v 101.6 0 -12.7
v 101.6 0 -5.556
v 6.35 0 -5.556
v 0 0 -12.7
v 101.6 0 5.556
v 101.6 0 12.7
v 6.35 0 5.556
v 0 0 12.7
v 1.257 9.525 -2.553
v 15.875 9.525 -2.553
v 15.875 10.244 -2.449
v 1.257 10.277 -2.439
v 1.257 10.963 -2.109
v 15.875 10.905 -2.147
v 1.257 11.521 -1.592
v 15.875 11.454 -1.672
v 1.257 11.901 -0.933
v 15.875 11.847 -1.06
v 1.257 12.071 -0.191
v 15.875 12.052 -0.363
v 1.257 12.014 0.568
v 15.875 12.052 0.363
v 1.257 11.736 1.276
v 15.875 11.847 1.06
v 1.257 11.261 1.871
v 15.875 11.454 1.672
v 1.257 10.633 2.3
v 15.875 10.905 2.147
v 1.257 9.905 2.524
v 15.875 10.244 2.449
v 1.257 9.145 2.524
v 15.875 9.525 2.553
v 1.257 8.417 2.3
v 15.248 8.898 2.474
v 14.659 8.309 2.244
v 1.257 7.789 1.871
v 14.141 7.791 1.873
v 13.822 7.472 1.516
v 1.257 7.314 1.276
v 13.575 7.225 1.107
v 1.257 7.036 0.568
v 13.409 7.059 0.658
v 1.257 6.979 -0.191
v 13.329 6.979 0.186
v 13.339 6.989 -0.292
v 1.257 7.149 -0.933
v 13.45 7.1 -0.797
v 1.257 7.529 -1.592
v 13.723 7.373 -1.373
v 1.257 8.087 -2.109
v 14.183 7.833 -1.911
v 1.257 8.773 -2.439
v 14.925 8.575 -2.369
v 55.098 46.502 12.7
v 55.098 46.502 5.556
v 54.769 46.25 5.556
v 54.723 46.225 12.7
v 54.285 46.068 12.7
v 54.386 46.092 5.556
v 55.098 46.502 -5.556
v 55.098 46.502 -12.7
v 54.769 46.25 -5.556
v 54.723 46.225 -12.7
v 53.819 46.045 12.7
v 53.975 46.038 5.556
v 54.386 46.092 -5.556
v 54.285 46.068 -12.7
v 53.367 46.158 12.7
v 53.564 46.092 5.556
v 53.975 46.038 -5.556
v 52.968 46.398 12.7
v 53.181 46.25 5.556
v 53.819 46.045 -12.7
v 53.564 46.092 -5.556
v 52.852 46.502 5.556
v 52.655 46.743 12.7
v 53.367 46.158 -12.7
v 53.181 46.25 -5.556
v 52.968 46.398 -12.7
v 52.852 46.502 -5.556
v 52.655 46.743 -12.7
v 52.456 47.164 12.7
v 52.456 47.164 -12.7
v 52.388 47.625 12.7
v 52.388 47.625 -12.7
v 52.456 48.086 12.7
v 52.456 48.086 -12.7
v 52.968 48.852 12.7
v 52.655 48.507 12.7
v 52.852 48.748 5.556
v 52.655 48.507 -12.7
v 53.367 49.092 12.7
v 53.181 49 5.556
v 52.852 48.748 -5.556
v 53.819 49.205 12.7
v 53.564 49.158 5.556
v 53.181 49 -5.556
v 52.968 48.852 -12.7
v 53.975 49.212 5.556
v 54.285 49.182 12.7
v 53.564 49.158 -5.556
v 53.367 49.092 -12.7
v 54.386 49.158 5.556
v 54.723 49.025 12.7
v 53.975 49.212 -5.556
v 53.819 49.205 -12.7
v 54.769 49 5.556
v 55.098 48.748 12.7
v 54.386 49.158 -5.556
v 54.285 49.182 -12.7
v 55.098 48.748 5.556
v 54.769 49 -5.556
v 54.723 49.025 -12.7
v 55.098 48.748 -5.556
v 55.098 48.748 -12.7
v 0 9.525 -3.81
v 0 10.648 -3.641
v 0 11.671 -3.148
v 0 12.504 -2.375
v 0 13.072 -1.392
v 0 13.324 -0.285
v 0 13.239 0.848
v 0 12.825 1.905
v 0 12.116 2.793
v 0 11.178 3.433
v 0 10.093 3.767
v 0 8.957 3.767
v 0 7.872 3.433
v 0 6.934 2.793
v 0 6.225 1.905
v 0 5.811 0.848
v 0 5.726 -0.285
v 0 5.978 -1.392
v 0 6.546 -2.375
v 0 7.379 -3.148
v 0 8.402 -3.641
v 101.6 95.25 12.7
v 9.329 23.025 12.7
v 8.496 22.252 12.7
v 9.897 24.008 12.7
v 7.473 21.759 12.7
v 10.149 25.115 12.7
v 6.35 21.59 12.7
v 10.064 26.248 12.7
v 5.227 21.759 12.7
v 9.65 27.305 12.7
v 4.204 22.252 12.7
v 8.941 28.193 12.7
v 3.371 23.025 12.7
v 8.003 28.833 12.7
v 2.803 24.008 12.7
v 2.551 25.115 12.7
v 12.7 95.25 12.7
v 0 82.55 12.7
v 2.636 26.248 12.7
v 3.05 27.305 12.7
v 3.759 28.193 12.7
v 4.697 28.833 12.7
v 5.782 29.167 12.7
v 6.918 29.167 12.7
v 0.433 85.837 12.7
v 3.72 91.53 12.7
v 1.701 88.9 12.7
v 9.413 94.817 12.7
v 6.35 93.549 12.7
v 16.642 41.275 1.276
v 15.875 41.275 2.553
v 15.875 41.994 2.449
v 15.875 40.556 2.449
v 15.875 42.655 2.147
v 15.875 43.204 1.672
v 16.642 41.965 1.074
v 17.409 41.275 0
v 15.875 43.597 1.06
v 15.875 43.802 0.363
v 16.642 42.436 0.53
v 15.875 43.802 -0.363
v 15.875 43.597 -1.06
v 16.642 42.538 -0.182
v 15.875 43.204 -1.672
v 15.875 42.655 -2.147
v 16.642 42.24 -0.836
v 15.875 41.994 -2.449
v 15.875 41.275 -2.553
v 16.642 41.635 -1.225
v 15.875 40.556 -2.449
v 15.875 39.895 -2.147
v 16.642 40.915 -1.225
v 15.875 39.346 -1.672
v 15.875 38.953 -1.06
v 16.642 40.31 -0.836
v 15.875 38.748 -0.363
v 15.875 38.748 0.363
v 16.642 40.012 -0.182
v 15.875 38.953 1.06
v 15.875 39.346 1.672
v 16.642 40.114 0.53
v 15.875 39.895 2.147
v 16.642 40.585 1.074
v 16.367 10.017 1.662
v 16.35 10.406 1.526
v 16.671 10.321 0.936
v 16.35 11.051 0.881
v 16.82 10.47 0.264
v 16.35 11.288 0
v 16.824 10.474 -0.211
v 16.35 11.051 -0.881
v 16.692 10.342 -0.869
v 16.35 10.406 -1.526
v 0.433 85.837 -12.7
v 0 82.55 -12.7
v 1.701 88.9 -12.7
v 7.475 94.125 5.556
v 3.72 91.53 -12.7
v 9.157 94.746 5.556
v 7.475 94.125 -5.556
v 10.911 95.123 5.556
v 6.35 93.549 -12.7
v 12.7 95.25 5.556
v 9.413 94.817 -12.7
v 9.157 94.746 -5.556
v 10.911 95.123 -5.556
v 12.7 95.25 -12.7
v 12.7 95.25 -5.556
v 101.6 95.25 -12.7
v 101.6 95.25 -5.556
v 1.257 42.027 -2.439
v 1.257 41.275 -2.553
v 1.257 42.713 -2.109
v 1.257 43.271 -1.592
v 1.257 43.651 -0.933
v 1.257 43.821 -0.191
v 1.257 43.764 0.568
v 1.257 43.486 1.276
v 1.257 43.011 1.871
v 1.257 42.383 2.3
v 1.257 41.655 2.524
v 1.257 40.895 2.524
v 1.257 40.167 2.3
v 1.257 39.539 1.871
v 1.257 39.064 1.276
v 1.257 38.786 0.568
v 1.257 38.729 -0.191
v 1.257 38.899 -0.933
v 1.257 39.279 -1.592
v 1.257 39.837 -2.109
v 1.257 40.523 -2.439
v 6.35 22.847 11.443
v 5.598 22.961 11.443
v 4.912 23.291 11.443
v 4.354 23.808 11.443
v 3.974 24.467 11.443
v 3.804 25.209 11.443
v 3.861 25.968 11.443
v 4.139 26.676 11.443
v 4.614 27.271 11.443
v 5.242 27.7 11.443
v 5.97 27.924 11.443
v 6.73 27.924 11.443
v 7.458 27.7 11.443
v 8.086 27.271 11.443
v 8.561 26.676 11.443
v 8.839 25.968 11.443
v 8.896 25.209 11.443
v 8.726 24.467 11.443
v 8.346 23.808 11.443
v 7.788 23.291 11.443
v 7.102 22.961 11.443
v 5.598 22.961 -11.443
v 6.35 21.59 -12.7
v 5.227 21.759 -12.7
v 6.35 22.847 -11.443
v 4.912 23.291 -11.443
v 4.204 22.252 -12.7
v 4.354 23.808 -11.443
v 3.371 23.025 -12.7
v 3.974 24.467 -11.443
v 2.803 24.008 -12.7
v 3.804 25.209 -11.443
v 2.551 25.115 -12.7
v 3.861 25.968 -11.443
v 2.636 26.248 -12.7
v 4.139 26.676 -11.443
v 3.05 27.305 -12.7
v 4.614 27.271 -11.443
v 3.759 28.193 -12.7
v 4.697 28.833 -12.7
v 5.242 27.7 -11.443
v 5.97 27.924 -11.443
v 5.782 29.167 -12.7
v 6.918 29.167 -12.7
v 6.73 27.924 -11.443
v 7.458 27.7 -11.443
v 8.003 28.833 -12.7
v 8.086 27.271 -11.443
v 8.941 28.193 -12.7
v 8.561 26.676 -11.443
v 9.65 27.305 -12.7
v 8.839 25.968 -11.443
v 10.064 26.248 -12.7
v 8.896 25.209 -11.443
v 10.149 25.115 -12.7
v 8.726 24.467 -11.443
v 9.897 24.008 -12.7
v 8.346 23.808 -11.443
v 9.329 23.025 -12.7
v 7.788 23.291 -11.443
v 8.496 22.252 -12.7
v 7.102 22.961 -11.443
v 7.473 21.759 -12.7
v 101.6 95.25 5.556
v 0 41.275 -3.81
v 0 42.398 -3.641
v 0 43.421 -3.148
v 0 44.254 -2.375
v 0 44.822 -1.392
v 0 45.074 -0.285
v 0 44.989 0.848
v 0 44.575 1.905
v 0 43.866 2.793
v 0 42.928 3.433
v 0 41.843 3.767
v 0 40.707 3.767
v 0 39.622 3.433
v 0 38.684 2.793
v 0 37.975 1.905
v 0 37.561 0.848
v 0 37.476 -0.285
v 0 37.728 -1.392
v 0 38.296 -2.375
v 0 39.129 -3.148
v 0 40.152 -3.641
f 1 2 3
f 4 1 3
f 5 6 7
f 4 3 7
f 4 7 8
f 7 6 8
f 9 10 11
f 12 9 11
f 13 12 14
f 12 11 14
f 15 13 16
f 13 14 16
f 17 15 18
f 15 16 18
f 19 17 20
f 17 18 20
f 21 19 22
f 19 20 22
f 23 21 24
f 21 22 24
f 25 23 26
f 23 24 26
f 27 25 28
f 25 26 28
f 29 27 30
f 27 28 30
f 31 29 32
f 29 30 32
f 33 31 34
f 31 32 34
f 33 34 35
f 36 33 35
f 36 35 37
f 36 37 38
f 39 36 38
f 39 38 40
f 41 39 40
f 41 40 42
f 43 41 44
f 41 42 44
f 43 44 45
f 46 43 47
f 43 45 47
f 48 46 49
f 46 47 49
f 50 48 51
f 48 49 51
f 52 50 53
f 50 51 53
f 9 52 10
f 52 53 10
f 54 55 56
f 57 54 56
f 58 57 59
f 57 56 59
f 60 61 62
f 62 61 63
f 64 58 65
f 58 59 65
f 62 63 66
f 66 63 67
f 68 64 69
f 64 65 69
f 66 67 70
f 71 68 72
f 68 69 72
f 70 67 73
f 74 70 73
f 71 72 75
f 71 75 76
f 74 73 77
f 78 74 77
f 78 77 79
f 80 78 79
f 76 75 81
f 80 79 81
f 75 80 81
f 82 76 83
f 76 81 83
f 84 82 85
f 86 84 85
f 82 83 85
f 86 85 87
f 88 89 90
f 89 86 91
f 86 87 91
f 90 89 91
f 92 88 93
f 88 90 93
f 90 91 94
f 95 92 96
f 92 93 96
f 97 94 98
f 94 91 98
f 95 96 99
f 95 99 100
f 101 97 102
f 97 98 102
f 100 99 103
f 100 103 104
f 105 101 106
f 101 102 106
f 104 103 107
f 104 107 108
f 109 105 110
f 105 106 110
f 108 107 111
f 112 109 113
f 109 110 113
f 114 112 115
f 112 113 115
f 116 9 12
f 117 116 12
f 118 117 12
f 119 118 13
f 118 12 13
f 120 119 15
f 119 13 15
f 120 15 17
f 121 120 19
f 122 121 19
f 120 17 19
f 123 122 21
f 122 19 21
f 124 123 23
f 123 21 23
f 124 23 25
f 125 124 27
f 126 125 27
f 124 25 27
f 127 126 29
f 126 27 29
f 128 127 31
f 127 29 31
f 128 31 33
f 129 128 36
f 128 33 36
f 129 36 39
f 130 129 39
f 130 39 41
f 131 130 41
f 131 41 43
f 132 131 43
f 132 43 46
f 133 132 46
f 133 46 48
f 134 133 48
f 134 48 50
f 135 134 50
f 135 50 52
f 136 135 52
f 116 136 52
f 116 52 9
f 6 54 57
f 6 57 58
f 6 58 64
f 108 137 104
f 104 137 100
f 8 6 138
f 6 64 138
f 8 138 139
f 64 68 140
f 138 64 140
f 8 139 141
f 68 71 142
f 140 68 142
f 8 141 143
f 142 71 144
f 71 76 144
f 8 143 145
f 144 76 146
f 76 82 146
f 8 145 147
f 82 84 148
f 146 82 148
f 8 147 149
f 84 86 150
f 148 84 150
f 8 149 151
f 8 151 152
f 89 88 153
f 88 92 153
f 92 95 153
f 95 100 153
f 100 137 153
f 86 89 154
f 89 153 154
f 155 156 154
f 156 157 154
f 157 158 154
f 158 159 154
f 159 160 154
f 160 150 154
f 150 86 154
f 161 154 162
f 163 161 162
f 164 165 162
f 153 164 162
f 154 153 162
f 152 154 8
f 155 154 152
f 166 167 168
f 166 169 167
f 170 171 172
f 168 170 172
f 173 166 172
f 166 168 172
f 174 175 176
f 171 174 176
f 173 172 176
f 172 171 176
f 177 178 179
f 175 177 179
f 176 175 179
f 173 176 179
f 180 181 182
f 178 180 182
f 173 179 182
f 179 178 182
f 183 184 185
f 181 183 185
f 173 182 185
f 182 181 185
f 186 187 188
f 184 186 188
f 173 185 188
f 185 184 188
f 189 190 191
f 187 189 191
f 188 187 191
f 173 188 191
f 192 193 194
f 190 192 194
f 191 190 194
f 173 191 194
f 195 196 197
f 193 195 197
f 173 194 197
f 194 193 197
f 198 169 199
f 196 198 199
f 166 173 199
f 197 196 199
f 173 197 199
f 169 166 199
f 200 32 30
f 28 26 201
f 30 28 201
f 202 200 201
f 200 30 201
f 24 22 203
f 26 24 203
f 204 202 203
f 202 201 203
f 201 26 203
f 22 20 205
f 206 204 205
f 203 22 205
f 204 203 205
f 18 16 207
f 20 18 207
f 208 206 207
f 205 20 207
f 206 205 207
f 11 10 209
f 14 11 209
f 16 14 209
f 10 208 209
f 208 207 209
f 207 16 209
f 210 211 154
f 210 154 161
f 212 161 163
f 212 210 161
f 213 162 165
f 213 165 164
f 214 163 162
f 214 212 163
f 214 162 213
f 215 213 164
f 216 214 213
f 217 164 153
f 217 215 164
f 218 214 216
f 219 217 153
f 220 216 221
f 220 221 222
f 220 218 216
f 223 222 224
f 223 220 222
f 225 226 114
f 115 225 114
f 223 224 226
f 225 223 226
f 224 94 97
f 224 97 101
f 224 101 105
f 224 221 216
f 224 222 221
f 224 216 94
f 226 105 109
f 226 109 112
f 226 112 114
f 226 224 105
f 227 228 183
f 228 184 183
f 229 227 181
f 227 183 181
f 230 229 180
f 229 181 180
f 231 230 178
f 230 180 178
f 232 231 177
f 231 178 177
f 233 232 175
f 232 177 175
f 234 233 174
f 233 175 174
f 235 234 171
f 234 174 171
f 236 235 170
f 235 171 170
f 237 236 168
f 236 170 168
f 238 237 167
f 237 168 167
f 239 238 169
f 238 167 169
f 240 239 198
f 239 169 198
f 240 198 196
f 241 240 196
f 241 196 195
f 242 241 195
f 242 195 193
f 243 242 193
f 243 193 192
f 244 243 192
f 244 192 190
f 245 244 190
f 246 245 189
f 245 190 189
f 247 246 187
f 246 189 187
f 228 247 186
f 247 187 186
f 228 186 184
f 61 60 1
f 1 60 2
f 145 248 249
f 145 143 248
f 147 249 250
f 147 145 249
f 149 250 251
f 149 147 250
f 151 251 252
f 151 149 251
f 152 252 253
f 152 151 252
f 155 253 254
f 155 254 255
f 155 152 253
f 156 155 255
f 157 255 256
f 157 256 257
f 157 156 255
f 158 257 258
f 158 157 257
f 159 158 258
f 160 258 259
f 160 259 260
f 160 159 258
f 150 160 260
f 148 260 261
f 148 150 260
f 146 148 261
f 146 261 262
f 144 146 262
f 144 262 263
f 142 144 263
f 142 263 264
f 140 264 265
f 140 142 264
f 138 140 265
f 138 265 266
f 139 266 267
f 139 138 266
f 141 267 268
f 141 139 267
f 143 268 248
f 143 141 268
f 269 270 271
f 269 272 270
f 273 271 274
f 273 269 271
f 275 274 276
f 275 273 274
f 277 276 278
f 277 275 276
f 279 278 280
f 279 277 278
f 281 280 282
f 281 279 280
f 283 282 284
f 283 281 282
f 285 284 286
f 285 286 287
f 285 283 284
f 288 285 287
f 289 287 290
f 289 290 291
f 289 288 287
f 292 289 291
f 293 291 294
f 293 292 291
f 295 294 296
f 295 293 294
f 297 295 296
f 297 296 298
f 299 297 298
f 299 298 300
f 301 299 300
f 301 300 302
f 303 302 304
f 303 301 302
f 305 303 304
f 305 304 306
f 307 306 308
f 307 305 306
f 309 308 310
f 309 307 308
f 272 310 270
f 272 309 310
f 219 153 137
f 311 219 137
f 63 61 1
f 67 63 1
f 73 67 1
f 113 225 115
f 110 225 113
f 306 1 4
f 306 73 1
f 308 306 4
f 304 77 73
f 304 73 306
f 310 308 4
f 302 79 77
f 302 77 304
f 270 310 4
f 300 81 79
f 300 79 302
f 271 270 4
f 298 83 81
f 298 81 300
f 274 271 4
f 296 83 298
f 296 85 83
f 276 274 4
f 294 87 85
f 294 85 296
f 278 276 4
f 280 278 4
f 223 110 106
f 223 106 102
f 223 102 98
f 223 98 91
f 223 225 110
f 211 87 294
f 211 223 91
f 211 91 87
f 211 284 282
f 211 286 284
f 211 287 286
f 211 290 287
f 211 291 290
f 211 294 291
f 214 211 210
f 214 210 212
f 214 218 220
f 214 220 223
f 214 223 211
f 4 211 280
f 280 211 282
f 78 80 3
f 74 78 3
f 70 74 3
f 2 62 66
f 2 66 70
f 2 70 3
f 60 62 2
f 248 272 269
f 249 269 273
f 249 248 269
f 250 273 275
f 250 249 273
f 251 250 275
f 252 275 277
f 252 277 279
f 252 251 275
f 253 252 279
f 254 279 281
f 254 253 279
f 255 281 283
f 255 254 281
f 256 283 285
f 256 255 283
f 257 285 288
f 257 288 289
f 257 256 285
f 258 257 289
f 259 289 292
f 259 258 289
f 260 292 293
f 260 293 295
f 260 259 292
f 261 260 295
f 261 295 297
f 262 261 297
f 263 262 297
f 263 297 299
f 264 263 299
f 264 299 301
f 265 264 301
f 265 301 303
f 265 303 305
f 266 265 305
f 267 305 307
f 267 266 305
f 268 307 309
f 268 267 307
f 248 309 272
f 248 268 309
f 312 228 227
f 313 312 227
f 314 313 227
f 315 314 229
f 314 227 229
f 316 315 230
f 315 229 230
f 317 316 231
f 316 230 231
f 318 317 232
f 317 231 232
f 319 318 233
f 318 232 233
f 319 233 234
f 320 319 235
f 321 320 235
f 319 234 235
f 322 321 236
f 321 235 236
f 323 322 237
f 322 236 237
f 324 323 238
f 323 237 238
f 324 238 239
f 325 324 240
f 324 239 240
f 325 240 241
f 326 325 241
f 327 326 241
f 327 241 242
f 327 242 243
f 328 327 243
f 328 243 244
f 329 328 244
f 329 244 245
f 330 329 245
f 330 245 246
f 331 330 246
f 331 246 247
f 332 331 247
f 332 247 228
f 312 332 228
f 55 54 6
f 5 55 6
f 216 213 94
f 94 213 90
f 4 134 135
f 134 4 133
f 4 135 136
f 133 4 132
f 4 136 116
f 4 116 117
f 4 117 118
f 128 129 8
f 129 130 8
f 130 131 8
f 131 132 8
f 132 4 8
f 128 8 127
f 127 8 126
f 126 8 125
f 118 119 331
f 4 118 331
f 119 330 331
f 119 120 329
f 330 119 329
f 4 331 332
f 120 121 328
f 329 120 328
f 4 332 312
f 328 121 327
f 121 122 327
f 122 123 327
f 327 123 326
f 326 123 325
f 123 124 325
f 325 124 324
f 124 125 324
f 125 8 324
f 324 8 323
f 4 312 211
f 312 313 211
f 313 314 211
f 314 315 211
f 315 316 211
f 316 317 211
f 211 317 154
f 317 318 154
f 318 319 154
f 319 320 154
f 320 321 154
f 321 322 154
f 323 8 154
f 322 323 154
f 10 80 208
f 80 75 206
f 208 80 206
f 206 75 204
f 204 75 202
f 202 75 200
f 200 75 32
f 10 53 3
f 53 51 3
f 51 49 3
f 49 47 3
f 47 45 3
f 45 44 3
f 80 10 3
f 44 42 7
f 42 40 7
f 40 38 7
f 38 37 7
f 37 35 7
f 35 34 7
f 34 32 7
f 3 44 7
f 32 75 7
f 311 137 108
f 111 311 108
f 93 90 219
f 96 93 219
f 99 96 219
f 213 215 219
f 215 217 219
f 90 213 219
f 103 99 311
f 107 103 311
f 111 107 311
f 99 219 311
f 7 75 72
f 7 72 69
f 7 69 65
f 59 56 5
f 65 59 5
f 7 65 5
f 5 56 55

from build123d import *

# Parameters (mm, degrees)
BOSS_EXTRUDE1_DEPTH               = 12.7
F_1_8_0_125_DIAMETER_HOLE1_D      = 3.175
FILLET1_R                         = 12.7
F_1_4_20_TAPPED_HOLE2_D           = 5.1054
F_1_4_20_TAPPED_HOLE2_DEPTH       = 15.875
F_1_4_20_TAPPED_HOLE2_CSINK_D     = 7.62
F_1_4_20_TAPPED_HOLE2_CSINK_ANGLE = 90
F_1_4_20_TAPPED_HOLE2_TIP         = 1.533816902
CUT_EXTRUDE1_DEPTH                = 5.55625


with BuildPart() as part:
    # Sketch2 → Boss-Extrude1 (new, symmetric)
    with BuildSketch(Plane.XY):
        Polygon((0, 0), (0, 95.25), (101.6, 95.25), (53.975, 47.625), (101.6, 0), align=None)
    extrude(amount=BOSS_EXTRUDE1_DEPTH, both=True)

    # 1/8 (0.125) Diameter Hole1 (through all)
    with Locations(Plane.XY.offset(12.7)):
        with Locations((53.975, 47.625)):
            Hole(F_1_8_0_125_DIAMETER_HOLE1_D / 2)

    # Fillet1
    fillet1_edges = [part.edges().sort_by_distance(p)[0] for p in [
        (0, 95.25, 0),
    ]]
    fillet(fillet1_edges, radius=FILLET1_R)

    # Sketch5 → 1/4-20 Tapped Hole1 (revolve, cut)
    with BuildSketch(Plane(origin=(6.35, 25.4, 12.7), x_dir=(0, -1, 0), z_dir=(1, 0, 0))):
        Polygon((0, 0), (0, 25.4), (3.81, 25.4), (2.5527, 24.1427), (2.5527, 1.2573), (3.81, 0), align=None)
    revolve(axis=Axis((6.35, 25.4, 19.05), (0, 0, -1)), mode=Mode.SUBTRACT)

    # 1/4-20 Tapped Hole2
    with Locations(Plane.ZY):
        with Locations((0, 41.275), (0, 9.525)):
            CounterSinkHole(F_1_4_20_TAPPED_HOLE2_D / 2, F_1_4_20_TAPPED_HOLE2_CSINK_D / 2, depth=F_1_4_20_TAPPED_HOLE2_DEPTH, counter_sink_angle=F_1_4_20_TAPPED_HOLE2_CSINK_ANGLE)
            with Locations((0, 0, -(F_1_4_20_TAPPED_HOLE2_DEPTH + F_1_4_20_TAPPED_HOLE2_TIP / 2))):  # 118° drill point
                Cone(0, F_1_4_20_TAPPED_HOLE2_D / 2, F_1_4_20_TAPPED_HOLE2_TIP, mode=Mode.SUBTRACT)

    # Sketch9 → Cut-Extrude1 (cut, symmetric)
    with BuildSketch(Plane.XY):
        Polygon((53.975, 47.625), (101.6, 95.25), (6.35, 95.25), align=None)
        Polygon((101.6, 0), (53.975, 47.625), (6.35, 0), align=None)
    extrude(amount=CUT_EXTRUDE1_DEPTH, both=True, mode=Mode.SUBTRACT)


solid = part.part
